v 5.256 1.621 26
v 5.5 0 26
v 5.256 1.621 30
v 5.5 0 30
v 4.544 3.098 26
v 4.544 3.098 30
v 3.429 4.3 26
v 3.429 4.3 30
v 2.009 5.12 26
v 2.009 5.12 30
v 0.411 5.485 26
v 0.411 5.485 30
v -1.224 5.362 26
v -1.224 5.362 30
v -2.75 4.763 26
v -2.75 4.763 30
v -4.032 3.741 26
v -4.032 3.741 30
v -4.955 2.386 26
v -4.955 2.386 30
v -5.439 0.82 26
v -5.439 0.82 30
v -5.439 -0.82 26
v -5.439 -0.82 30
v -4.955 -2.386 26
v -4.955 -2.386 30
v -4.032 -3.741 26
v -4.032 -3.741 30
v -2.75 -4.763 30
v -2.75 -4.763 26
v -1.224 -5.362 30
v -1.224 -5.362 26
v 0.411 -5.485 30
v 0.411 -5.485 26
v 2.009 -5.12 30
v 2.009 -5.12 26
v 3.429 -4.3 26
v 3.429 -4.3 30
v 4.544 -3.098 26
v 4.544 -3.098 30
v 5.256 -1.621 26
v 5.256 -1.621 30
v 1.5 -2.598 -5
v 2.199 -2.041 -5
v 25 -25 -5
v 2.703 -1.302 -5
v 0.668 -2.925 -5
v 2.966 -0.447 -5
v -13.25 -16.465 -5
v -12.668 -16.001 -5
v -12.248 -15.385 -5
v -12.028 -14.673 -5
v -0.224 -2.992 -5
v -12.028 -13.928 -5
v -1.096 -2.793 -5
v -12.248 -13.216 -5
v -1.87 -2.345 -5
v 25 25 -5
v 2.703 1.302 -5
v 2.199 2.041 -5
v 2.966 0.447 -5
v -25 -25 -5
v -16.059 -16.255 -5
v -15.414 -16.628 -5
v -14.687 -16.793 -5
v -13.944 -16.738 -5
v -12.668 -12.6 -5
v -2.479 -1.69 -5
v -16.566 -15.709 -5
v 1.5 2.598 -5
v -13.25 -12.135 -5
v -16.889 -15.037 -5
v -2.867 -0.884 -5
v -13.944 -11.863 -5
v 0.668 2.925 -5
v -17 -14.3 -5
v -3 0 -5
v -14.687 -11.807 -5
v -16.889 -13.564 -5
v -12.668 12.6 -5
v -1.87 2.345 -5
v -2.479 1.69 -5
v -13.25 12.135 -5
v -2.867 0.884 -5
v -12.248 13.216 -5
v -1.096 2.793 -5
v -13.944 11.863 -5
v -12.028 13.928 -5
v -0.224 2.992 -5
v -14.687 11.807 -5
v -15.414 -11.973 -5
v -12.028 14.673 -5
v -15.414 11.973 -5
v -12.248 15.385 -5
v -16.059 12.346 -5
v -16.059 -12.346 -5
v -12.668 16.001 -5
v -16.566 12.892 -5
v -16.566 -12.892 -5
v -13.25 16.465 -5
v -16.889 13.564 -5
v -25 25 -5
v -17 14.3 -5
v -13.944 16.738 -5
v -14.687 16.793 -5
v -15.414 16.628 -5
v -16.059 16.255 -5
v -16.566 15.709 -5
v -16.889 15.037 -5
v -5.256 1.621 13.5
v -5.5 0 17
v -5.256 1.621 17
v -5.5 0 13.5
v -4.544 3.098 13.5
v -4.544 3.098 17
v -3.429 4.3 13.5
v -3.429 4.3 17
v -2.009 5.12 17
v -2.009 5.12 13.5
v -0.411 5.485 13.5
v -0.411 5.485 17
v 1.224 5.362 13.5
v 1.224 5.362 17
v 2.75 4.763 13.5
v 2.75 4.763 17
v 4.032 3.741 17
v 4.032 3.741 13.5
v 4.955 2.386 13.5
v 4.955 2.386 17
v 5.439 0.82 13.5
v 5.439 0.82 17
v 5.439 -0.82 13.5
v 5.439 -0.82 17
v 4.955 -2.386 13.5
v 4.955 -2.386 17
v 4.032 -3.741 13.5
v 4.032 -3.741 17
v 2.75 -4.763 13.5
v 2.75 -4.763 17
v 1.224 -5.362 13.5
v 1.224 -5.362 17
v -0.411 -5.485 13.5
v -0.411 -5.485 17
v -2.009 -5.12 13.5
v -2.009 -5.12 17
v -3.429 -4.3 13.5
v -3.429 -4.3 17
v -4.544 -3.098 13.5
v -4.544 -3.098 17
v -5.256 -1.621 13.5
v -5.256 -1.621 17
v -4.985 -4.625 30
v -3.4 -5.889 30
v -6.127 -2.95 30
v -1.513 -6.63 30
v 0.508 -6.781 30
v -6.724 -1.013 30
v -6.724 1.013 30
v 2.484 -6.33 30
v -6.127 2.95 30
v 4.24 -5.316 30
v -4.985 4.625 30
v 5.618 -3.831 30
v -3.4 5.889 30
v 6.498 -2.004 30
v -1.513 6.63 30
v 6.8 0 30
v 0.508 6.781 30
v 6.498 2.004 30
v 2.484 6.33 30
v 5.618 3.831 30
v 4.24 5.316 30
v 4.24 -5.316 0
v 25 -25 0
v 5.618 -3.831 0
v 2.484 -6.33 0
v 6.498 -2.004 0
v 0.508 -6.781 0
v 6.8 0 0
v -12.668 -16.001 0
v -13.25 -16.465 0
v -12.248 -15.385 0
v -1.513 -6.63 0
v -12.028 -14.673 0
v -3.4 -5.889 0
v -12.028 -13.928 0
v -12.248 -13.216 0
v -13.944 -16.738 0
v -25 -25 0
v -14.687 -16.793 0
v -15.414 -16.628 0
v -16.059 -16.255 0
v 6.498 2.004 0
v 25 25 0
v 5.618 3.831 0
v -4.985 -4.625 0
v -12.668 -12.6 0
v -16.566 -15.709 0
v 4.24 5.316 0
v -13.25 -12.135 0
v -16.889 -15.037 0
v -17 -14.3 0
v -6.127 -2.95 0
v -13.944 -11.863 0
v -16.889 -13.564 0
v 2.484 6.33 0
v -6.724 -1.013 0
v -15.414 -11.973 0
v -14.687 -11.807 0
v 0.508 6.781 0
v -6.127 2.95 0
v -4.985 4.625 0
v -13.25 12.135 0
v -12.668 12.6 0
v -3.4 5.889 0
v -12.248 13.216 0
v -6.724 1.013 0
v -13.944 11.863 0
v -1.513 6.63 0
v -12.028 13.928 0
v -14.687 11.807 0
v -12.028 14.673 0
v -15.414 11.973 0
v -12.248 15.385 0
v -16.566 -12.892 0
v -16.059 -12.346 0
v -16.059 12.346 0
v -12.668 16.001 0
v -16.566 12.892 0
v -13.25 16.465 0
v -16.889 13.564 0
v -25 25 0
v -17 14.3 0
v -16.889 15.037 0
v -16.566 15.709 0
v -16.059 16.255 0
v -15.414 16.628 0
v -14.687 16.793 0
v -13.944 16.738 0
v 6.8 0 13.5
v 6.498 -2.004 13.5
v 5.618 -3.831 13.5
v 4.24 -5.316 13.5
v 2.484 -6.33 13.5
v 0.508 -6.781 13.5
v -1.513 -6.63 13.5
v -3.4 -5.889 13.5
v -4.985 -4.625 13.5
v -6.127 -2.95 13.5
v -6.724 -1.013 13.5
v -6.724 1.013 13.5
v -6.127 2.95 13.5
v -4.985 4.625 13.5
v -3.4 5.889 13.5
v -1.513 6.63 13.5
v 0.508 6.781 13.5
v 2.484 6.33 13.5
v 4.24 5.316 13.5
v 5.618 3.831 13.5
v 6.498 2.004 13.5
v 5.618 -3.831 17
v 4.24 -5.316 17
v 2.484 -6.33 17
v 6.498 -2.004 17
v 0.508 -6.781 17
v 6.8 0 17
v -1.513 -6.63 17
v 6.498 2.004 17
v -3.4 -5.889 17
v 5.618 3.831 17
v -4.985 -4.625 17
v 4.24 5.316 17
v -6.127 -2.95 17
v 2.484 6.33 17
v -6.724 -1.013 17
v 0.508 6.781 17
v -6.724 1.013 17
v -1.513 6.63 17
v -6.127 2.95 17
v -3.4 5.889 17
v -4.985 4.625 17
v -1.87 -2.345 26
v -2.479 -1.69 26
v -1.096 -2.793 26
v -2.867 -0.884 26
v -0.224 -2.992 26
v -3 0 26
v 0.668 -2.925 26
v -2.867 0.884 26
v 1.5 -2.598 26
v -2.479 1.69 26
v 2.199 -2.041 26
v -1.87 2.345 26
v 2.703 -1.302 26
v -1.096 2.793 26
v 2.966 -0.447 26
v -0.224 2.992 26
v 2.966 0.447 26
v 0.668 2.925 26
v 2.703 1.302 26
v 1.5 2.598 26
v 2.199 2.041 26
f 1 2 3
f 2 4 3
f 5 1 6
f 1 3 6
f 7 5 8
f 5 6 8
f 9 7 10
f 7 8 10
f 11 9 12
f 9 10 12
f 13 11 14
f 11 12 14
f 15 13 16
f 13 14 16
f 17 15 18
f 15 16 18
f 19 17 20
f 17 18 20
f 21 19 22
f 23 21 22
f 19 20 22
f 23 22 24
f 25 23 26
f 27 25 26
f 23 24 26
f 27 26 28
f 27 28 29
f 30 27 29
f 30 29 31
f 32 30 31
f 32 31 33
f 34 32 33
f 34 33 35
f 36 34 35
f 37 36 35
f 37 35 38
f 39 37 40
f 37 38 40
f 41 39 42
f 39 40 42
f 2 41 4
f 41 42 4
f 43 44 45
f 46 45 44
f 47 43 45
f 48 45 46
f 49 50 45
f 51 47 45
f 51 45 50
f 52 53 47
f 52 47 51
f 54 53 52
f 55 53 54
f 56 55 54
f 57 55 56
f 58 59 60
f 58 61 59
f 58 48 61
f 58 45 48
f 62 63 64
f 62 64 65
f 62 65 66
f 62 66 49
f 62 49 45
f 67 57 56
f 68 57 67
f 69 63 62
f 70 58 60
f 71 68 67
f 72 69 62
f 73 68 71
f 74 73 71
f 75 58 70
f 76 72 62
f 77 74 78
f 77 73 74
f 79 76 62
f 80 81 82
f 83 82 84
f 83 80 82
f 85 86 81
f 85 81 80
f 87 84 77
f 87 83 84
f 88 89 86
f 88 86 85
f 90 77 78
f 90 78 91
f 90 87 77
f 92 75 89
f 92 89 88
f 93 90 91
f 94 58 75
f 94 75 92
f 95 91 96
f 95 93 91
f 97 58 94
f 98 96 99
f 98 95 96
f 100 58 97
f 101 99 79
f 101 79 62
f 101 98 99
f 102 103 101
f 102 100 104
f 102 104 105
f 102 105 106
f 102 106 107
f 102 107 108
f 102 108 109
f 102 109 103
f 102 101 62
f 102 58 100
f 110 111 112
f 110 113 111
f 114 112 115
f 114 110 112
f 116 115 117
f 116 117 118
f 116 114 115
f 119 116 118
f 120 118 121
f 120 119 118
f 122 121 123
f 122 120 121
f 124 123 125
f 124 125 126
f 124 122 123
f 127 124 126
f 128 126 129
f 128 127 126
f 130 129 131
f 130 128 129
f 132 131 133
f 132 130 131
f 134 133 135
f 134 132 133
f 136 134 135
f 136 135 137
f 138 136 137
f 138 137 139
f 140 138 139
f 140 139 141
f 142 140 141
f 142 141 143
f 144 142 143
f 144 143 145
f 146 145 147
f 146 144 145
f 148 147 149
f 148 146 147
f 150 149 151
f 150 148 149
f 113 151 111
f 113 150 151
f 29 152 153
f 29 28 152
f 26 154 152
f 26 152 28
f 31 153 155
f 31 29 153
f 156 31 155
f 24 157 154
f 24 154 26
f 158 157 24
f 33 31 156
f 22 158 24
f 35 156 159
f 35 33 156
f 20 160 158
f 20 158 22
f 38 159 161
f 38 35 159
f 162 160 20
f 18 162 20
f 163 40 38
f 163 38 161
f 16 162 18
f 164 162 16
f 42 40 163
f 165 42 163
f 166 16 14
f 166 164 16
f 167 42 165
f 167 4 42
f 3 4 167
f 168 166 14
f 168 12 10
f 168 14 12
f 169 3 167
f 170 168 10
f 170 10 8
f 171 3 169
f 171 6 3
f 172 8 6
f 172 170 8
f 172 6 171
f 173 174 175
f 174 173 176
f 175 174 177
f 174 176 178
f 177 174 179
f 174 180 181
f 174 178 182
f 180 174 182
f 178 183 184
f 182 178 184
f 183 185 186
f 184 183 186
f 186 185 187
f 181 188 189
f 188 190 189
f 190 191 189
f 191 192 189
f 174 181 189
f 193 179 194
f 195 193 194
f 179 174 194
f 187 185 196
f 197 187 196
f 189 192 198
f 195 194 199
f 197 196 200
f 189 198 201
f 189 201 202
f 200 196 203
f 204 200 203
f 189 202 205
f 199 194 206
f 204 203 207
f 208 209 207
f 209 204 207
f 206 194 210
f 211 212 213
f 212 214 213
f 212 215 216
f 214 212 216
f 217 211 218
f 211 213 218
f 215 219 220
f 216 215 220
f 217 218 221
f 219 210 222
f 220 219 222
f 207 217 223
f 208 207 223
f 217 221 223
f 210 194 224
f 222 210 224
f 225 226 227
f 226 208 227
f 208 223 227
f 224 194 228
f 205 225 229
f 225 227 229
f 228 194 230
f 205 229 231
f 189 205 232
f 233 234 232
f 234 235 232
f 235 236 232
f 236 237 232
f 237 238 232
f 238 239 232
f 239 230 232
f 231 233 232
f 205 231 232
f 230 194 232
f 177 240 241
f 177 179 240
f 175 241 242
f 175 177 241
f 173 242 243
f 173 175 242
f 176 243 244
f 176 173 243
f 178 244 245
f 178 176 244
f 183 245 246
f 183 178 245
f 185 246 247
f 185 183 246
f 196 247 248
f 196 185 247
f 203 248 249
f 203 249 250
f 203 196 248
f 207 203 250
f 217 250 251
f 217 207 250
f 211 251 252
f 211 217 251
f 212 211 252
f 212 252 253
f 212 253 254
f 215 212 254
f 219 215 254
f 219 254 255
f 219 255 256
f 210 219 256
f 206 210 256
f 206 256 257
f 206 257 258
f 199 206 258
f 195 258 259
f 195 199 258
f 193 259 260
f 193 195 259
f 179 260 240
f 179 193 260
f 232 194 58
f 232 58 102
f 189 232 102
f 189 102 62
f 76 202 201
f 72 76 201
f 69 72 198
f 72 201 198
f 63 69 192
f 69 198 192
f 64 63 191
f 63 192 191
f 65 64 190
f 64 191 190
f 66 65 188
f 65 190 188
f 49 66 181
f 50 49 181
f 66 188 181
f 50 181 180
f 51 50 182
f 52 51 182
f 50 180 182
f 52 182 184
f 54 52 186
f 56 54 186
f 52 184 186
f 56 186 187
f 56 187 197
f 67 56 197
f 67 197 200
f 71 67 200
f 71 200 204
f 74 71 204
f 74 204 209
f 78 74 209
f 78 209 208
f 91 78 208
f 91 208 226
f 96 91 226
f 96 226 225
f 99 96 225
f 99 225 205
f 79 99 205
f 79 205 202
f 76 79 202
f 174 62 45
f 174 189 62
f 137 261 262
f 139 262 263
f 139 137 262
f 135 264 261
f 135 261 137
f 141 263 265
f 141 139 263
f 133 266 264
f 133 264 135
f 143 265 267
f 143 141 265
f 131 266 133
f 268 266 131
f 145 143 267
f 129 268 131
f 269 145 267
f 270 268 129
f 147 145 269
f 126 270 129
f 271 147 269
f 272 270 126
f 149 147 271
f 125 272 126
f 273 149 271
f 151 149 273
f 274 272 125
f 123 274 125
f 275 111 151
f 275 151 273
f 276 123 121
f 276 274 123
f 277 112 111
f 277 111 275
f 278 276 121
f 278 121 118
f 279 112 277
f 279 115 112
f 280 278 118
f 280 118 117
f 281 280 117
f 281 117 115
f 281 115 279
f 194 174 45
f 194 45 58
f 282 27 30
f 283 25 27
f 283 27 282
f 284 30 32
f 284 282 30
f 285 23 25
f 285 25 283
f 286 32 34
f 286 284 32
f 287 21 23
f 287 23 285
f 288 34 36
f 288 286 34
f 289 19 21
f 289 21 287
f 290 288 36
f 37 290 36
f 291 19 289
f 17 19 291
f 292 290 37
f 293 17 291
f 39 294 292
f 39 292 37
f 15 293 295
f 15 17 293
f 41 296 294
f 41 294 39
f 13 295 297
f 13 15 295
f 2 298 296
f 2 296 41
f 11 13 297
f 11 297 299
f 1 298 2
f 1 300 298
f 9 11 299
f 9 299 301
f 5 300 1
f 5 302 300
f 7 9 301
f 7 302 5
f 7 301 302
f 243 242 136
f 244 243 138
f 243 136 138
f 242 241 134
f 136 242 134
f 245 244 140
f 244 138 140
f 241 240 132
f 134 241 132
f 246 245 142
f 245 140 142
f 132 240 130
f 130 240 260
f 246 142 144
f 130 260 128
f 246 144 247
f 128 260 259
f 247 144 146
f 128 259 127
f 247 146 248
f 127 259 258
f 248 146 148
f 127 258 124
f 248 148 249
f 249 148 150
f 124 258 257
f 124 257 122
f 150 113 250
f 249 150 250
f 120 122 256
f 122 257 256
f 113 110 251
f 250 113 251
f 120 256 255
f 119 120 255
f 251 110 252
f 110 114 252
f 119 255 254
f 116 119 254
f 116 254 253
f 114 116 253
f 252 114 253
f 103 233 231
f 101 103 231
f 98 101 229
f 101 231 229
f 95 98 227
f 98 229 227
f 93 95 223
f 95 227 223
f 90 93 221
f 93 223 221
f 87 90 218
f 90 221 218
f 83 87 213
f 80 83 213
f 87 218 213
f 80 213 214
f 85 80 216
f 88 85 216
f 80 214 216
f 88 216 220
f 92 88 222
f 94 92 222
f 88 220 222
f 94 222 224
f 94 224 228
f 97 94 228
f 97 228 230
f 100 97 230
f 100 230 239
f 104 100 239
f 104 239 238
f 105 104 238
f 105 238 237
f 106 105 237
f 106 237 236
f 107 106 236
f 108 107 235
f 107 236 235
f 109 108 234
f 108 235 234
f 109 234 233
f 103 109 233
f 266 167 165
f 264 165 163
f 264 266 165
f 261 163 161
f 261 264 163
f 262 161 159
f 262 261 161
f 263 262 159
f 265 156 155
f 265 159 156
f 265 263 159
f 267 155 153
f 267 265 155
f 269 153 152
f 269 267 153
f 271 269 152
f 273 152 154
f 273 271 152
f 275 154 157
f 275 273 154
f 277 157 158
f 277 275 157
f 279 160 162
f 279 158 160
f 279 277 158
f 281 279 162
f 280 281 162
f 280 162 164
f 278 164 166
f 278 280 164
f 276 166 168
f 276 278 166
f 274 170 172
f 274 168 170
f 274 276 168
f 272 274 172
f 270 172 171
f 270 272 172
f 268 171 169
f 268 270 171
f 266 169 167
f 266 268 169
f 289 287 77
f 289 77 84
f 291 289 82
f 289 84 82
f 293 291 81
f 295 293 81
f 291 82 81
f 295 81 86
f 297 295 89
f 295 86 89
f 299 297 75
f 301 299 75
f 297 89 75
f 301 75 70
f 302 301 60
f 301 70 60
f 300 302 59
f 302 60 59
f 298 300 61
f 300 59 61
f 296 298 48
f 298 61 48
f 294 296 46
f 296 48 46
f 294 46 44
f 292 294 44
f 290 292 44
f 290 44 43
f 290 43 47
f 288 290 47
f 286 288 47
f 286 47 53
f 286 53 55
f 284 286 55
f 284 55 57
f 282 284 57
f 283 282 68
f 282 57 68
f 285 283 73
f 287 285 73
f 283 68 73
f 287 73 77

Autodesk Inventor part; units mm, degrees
ref_plane "YZ Plane" through (0, 0, 0) normal (1, 0, 0) x (0, 1, 0)
ref_plane "XZ Plane" through (0, 0, 0) normal (0, 1, 0) x (-1, 0, 0)
sketch "Boceto1" plane through (0, 0, 0) normal (0, 0, 1) x (1, 0, 0)
  circle A0 centre (0, 0) radius 6.8
  dimension "d0" = 13.6
extrude "Extrusión1" add sketch "Boceto1" along normal blind 30
ref_plane "Plano de trabajo1" through (0, 0, 13.5) normal (0, 0, -1) x (-1, 0, 0)
sketch "Boceto2" plane through (0, 0, 13.5) normal (0, 0, -1) x (-1, 0, 0)
  circle A0 centre (0, 0) radius 5.5
  circle A1 centre (0, 0) radius 7
  dimension "d4" = 11
  dimension "d5" = 14
extrude "Extrusión2" cut sketch "Boceto2" against normal blind 3.5
sketch "Boceto3" plane through (0, 0, 0) normal (0, 0, -1) x (-1, 0, 0)
  line L0 (-25, 25) -> (25, 25)
  line L1 (25, 25) -> (25, -25)
  line L2 (25, -25) -> (-25, -25)
  line L3 (-25, -25) -> (-25, 25)
  line L4 (-25, 25) -> (25, -25) construction
  line L5 (25, 25) -> (-25, -25) construction
  line L6 (25, 25) -> (15, 25)
  line L7 (15, 25) -> (15, 16.75)
  line L8 (16.95, 14.8) -> (25, 14.8)
  line L9 (25, 14.8) -> (25, 25)
  line L10 (25, -25) -> (15, -25)
  line L11 (15, -25) -> (15, -16.75)
  line L12 (16.95, -14.8) -> (25, -14.8)
  line L13 (25, -14.8) -> (25, -25)
  line L14 (-25, 25) -> (-14.8, 25)
  line L15 (-14.8, 25) -> (-14.8, 16.95)
  line L16 (-16.75, 15) -> (-25, 15)
  line L17 (-25, 15) -> (-25, 25)
  line L18 (-25, -25) -> (-15, -25)
  line L19 (-15, -25) -> (-15, -16.9397)
  line L20 (-16.75, -15) -> (-25, -15)
  line L21 (-25, -15) -> (-25, -25)
  circle A0 centre (14.5004, 14.3004) radius 2.5
  circle A1 centre (14.5004, -14.3004) radius 2.5
  circle A2 centre (-14.8, 15) radius 1.95
  circle A3 centre (-14.8, -15) radius 1.95
  point P0 (0, 0)
  dimension "d8" = 50
  dimension "d9" = 50
  dimension "d18" = 5
  dimension "d19" = 5
  dimension "d20" = 3.9
  dimension "d21" = 3.9
  dimension "d24" = 8.25
  dimension "d25" = 8.05
  dimension "d26" = 8.25
  dimension "d27" = 8.0603
  dimension "d28" = 8.25
  dimension "d29" = 8.05
  dimension "d30" = 8.25
  dimension "d31" = 8.05
extrude "Extrusión3" add sketch "Boceto3" along normal blind 5 contours L0 L15 A2 L16 L3 | L0 L7 A0 L8 L1 L12 A1 L11 L2 L19 A3 L20 L3 L16 A2 L15 | L0 L1 L8 A0 L7 | L20 A3 L19 L2 L3 | L1 L2 L11 A1 L12
sketch "Boceto4" plane through (0, 0, 13.5) normal (0, 0, -1) x (-1, 0, 0)
  point P0 (0, 0)
sketch "Boceto5" plane through (0, 0, -5) normal (0, 0, -1) x (-1, 0, 0)
  circle A0 centre (0, 0) radius 5.5 projected
  circle A1 centre (0, 0) radius 3
  dimension "d32" = 6
extrude "Extrusión4" cut sketch "Boceto5" against normal blind 33 contours A1
sketch "Boceto6" plane through (0, 0, 30) normal (0, 0, 1) x (1, 0, 0)
  circle A0 centre (0, 0) radius 5.5
  dimension "d35" = 11
extrude "Extrusión5" cut sketch "Boceto6" against normal blind 4
sketch "Boceto7" plane through (0, 0, -5) normal (0, 0, -1) x (-1, 0, 0)
  circle A0 centre (-14.8, -15) radius 1.95 projected
  circle A1 centre (-14.8, 15) radius 1.95 projected
  point P0 (0, 0)
extrude "Extrusión6" add sketch "Boceto7" against normal up to surface (5 mm away)
properties part number "pieza_2_vinculacion"
